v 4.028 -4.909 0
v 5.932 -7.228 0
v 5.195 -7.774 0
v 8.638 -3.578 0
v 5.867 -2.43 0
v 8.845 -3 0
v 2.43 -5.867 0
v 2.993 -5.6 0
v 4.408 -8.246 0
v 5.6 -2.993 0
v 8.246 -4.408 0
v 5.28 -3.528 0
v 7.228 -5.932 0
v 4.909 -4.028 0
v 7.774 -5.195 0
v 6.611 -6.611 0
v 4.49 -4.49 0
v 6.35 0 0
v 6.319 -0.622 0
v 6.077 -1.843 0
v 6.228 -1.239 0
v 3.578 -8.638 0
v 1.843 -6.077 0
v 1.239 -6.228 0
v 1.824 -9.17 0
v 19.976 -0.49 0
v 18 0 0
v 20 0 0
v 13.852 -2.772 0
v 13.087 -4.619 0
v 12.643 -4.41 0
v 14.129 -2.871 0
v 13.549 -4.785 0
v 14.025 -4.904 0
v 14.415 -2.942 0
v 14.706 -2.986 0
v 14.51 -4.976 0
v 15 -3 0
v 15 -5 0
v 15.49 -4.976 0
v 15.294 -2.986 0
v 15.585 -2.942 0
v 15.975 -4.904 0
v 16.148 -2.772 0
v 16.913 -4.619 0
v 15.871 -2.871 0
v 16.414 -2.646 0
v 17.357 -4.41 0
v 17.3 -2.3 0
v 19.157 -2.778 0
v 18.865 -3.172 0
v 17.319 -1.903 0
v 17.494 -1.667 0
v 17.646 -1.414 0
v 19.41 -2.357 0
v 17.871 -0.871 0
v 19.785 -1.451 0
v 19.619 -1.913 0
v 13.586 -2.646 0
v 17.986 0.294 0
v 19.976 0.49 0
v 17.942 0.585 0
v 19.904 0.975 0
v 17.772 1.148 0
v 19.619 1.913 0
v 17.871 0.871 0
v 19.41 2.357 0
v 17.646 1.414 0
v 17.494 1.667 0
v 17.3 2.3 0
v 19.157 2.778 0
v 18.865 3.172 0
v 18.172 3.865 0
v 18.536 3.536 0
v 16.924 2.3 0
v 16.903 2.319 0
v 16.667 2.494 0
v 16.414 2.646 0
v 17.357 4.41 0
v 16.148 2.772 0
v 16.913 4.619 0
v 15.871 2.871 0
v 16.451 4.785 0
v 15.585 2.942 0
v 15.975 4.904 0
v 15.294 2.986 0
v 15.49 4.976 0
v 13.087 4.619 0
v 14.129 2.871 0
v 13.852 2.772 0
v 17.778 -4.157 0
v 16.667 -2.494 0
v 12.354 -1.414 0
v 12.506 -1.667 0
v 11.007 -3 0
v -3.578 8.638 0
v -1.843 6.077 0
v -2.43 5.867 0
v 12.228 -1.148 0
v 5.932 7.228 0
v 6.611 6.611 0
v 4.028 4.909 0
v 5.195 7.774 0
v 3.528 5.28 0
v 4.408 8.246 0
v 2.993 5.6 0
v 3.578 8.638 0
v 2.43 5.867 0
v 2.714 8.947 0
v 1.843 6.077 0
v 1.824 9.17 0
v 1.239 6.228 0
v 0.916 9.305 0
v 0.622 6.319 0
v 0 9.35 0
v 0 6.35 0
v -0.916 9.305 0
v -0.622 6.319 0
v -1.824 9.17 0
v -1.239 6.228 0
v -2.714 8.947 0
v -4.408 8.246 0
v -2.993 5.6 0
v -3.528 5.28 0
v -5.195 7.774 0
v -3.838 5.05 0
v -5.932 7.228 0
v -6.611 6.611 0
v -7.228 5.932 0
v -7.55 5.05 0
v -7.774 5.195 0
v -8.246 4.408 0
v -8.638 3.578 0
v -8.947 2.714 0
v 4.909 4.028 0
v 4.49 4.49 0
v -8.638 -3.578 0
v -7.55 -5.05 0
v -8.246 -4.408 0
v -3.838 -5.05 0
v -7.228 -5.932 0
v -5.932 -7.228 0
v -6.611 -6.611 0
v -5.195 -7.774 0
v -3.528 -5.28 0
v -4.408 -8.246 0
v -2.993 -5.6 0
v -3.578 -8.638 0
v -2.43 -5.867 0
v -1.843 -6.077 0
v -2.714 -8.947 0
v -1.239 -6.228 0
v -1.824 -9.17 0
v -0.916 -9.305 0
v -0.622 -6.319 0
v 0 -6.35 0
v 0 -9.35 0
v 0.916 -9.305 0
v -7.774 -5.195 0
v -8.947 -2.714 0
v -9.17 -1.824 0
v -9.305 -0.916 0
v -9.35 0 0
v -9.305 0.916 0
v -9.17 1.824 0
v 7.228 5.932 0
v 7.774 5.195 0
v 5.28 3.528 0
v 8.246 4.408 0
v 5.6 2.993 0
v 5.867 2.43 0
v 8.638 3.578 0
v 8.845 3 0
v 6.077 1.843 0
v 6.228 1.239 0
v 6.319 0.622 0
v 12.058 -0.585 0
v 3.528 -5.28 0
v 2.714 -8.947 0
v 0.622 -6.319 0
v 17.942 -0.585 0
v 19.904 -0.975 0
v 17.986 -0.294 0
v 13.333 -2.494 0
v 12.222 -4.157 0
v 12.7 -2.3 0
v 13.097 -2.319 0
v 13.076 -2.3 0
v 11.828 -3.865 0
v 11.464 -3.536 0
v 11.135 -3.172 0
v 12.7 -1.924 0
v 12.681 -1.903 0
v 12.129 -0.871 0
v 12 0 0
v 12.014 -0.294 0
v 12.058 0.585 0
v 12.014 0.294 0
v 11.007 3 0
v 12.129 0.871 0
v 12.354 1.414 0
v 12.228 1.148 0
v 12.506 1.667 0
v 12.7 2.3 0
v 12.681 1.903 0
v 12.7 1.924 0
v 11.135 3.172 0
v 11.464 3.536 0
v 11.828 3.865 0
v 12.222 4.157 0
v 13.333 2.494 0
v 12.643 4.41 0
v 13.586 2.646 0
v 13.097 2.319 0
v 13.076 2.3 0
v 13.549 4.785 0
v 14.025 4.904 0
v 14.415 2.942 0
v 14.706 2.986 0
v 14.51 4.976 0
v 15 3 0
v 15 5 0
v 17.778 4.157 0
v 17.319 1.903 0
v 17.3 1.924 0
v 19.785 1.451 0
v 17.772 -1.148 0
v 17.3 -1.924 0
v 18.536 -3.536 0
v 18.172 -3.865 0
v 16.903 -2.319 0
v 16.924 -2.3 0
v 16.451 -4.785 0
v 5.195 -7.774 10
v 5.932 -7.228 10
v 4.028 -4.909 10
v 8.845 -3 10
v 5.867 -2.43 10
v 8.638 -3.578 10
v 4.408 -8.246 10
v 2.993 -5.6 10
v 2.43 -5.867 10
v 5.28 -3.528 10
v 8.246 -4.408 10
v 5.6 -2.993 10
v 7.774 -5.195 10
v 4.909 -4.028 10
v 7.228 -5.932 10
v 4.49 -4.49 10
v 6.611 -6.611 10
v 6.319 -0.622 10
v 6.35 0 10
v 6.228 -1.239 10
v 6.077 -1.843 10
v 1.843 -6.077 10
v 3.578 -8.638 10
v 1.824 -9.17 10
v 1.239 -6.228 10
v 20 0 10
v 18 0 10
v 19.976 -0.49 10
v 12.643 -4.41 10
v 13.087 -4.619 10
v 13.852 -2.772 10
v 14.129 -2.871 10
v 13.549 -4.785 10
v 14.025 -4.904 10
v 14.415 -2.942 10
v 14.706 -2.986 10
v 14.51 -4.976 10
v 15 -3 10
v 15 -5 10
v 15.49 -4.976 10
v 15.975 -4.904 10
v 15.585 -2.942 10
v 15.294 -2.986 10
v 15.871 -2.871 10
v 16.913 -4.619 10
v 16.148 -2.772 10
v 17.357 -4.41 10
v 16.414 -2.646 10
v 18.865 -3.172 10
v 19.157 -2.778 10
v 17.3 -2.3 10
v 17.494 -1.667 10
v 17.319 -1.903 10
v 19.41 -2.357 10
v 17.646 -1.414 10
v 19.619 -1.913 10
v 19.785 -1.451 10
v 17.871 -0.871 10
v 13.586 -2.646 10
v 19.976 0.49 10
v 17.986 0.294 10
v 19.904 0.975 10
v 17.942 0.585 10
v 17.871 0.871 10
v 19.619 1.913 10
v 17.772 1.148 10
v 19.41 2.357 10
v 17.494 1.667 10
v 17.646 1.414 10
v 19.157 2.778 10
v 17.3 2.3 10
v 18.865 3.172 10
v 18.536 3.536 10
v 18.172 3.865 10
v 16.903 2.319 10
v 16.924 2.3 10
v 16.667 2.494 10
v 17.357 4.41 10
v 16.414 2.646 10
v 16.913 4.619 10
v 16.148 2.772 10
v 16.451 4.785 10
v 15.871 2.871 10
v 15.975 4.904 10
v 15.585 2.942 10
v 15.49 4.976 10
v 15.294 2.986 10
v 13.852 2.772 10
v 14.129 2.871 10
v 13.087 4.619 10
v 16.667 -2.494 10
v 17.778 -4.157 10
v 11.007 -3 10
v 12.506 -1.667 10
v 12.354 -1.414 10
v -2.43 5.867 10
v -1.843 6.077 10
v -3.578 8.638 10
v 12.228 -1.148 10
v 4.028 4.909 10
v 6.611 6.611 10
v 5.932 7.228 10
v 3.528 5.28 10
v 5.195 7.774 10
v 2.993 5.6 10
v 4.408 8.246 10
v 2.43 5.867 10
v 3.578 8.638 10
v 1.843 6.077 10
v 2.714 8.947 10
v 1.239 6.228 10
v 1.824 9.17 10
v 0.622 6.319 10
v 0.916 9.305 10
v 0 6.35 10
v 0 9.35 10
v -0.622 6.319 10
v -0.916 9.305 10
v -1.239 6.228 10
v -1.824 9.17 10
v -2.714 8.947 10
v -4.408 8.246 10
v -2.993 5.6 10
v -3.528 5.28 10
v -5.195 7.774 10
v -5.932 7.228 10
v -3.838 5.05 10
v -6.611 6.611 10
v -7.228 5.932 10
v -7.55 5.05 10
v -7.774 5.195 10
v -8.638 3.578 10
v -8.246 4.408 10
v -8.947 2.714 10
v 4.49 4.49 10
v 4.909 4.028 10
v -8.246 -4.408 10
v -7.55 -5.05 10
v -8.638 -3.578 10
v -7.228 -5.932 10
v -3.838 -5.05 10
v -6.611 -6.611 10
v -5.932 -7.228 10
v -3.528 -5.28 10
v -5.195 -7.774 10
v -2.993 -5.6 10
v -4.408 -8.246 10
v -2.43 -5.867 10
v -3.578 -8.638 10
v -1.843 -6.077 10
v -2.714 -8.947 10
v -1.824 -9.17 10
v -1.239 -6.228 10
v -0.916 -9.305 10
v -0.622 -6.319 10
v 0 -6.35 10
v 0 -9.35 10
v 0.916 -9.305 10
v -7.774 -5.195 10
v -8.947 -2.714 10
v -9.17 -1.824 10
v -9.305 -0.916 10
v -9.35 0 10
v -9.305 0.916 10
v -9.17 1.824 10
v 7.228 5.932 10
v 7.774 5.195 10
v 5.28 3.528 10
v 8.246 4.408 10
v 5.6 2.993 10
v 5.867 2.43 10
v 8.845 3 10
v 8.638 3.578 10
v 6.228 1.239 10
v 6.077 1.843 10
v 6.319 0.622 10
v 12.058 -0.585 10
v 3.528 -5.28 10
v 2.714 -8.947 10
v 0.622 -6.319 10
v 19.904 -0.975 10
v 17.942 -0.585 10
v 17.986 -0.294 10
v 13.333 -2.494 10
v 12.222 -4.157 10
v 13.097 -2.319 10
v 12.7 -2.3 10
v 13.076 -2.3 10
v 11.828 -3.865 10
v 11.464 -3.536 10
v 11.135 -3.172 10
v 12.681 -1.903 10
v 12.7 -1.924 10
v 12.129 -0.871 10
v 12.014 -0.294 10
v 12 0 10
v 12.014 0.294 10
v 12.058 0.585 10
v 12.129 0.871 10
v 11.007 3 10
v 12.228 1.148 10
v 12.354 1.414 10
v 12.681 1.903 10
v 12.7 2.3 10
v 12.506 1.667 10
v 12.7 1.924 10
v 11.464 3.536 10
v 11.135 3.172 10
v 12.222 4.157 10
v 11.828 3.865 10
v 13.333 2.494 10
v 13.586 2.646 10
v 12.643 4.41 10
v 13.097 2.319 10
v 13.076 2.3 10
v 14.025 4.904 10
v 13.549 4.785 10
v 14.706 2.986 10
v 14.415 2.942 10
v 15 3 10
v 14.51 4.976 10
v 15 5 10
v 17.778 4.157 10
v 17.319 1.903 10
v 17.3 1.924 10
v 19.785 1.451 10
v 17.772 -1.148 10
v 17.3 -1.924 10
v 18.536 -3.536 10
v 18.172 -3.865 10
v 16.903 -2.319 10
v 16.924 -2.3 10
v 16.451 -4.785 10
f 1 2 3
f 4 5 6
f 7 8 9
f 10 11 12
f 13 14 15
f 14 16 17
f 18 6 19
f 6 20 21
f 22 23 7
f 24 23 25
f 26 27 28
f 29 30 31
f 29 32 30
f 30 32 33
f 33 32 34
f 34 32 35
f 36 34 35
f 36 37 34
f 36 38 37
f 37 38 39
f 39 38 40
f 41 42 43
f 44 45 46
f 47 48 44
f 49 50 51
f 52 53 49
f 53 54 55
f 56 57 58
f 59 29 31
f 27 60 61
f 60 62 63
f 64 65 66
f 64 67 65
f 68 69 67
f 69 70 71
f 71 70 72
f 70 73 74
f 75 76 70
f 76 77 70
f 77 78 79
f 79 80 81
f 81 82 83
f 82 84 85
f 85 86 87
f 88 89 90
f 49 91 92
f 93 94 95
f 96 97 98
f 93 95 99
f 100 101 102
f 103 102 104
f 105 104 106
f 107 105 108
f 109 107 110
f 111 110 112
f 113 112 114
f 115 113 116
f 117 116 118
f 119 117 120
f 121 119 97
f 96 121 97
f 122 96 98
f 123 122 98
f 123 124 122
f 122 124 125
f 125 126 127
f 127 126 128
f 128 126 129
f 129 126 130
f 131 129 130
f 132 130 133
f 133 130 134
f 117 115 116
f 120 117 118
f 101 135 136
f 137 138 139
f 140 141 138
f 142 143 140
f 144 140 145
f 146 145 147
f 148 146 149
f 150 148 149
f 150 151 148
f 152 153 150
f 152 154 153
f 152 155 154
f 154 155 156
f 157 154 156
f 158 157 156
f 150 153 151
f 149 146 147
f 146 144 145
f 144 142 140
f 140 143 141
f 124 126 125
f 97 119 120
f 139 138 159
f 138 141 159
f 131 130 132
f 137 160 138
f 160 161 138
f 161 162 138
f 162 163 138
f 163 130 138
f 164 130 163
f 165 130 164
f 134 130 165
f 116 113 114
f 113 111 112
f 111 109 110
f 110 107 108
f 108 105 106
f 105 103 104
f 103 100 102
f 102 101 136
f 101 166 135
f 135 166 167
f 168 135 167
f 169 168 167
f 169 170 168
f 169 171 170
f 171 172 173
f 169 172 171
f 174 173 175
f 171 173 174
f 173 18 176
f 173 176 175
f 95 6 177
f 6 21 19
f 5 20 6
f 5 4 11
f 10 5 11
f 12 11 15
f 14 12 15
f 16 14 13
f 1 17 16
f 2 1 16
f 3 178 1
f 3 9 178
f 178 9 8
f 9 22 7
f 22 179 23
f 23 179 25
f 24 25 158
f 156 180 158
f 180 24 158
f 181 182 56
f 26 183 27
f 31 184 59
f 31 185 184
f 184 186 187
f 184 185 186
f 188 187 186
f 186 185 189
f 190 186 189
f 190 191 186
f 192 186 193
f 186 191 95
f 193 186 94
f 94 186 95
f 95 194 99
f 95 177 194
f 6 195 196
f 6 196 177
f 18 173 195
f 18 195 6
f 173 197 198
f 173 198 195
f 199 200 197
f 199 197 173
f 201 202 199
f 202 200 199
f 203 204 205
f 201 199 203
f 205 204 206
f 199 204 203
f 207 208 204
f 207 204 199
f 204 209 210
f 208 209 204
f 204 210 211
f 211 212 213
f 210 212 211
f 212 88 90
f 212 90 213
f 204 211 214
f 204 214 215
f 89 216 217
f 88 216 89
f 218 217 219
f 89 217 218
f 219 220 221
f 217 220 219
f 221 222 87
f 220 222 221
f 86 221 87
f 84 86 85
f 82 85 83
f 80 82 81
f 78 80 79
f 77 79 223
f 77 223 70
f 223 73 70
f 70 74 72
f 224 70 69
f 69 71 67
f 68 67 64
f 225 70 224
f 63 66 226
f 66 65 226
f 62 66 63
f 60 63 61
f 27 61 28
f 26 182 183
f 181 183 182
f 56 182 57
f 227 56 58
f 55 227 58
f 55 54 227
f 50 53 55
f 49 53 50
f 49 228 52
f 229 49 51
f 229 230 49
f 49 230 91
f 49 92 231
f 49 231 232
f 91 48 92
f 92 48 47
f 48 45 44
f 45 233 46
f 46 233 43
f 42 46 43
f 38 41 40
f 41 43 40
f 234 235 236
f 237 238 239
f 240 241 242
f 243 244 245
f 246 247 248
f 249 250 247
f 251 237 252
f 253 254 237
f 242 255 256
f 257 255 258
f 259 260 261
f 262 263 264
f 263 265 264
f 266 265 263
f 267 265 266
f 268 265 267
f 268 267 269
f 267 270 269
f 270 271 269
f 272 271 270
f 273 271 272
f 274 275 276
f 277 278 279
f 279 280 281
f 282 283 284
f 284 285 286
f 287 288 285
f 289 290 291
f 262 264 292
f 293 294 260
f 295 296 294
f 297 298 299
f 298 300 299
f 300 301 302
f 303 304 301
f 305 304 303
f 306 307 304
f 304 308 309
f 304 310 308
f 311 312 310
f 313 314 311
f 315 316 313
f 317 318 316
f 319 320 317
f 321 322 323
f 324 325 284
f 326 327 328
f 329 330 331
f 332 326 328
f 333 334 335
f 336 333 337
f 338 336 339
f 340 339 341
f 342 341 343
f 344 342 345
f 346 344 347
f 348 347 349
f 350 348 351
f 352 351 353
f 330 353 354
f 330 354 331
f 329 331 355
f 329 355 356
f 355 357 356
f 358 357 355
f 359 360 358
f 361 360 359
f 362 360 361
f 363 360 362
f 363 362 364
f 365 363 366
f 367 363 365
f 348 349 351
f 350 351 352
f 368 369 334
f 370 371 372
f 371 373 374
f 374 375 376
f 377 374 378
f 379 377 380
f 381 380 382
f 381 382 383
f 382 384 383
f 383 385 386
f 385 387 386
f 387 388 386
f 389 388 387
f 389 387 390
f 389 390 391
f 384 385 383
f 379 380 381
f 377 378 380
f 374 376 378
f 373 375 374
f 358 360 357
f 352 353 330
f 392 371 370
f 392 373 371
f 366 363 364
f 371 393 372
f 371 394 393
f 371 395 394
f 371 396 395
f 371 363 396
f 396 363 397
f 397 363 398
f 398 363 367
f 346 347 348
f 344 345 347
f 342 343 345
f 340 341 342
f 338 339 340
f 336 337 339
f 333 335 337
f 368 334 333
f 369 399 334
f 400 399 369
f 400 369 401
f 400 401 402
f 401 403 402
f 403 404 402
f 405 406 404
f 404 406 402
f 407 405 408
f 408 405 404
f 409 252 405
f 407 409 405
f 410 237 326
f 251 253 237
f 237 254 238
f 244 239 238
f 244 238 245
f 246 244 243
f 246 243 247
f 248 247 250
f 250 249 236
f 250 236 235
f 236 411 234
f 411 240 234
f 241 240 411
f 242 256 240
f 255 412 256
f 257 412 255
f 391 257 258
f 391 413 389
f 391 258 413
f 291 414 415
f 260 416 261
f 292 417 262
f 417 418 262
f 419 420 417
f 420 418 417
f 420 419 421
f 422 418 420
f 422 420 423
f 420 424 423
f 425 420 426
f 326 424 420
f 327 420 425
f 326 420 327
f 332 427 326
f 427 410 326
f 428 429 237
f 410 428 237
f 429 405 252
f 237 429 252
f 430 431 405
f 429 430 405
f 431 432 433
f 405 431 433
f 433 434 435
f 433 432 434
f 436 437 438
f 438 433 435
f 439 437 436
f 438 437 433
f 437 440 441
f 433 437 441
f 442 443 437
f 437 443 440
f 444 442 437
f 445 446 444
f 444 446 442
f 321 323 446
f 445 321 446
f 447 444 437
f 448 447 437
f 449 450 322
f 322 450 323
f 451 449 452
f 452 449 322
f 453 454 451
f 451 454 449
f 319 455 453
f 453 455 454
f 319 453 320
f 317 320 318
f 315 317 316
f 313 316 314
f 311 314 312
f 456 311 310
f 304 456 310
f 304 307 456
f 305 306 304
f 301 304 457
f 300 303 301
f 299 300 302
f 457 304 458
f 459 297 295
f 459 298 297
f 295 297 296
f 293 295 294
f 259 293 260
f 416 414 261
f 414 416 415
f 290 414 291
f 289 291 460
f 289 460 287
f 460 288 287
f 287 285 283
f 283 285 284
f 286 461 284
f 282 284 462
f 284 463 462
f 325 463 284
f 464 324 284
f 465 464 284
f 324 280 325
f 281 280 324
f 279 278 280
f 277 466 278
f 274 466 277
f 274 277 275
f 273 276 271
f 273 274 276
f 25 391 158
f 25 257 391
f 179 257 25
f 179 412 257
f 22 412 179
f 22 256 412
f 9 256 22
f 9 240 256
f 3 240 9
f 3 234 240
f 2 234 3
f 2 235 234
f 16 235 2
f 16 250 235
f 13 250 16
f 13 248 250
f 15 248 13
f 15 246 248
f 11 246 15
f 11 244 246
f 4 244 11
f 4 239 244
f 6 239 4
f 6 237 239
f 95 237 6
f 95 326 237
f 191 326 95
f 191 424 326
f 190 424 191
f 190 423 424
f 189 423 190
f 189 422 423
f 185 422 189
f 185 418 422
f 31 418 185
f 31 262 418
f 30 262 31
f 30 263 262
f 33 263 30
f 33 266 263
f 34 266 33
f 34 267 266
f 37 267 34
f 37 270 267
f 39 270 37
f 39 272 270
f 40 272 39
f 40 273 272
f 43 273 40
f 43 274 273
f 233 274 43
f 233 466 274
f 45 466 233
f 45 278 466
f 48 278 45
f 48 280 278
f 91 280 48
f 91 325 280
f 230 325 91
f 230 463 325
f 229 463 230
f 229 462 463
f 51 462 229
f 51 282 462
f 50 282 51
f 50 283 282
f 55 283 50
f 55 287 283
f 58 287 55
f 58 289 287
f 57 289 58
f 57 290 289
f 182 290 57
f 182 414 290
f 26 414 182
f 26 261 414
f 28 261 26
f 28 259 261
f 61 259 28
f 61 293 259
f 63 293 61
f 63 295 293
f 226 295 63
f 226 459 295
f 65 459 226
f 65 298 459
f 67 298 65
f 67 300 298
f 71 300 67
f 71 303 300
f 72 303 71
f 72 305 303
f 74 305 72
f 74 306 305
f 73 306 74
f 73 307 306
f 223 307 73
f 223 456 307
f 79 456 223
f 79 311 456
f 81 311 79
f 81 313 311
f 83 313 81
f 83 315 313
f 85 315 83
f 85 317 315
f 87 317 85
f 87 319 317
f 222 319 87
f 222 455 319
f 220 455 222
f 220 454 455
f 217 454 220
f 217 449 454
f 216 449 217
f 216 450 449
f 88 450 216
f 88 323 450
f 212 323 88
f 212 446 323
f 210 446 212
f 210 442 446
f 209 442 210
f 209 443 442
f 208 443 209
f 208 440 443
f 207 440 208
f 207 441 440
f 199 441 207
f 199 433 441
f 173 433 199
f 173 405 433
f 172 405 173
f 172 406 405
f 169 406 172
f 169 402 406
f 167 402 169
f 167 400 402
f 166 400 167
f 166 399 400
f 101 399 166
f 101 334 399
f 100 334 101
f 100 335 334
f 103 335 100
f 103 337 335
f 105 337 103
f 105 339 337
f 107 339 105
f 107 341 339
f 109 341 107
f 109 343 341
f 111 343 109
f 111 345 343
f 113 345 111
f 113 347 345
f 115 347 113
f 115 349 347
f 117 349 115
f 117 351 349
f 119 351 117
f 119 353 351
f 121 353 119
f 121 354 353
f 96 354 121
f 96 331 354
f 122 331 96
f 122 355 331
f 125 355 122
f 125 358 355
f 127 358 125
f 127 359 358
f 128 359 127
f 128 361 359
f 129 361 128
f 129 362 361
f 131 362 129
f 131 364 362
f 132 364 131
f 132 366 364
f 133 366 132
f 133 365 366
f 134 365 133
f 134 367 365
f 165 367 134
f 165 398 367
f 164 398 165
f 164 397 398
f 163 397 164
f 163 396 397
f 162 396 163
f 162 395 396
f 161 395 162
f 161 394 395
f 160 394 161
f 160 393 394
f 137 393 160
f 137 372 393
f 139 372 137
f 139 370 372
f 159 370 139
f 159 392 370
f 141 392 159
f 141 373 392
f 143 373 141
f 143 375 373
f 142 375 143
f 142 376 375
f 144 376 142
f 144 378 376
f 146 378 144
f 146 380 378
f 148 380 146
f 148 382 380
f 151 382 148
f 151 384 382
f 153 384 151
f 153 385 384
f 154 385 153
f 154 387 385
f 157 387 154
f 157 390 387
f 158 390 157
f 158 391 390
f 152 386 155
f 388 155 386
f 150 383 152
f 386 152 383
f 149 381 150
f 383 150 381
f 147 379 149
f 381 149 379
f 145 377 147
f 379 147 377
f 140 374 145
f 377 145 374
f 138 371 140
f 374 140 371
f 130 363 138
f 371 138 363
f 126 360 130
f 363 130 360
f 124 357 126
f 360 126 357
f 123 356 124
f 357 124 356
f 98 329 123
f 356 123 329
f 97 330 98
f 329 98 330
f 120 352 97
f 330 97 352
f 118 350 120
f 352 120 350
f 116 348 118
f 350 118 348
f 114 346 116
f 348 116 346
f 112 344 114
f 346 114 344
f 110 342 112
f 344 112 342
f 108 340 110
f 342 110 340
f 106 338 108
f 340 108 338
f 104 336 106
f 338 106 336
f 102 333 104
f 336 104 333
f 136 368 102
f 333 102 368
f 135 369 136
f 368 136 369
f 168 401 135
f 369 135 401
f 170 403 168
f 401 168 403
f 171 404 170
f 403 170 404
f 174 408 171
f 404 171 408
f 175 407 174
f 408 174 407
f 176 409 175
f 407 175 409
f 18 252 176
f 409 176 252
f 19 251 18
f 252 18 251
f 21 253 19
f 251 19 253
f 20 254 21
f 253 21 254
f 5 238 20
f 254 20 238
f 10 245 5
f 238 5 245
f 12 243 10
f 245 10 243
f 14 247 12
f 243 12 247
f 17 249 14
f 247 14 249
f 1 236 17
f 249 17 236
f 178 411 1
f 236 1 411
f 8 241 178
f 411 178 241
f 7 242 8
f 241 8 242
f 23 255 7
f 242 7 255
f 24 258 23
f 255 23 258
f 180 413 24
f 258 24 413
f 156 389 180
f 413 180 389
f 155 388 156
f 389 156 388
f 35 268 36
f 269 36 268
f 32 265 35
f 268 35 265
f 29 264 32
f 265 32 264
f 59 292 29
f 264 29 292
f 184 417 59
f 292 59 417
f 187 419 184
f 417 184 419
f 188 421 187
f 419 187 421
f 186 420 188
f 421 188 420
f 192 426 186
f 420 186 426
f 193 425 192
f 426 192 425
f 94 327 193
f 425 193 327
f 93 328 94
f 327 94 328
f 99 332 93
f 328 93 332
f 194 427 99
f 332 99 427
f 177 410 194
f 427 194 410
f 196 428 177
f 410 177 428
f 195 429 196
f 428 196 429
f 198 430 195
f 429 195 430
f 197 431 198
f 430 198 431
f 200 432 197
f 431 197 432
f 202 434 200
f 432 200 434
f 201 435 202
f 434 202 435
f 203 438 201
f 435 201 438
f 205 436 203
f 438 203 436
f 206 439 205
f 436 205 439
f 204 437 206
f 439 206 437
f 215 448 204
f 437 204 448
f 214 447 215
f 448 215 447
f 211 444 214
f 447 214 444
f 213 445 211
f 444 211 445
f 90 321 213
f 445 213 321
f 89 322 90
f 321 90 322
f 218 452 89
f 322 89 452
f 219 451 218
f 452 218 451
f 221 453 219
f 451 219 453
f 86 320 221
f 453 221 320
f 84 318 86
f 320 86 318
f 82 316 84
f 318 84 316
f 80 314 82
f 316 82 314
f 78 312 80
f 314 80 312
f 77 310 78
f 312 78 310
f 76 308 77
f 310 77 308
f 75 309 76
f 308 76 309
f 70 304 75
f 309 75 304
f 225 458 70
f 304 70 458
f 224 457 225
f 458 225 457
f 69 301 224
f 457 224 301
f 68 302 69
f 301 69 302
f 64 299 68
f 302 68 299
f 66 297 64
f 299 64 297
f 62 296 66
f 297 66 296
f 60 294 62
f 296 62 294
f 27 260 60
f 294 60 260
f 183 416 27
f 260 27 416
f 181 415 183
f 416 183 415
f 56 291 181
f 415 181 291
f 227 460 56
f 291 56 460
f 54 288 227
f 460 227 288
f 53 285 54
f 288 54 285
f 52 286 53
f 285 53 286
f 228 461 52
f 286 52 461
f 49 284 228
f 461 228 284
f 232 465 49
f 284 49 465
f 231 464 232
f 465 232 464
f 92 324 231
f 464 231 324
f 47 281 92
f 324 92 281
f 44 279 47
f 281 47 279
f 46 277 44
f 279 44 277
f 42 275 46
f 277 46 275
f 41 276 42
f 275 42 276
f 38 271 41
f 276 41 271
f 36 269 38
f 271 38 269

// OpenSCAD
// --- Parameters (Dimensions in mm) ---

// Rod Ring (Inner diameter 12.7mm, Wall 3mm)
rod_inner_dia = 12.7;
rod_wall = 3.0;
rod_outer_dia = rod_inner_dia + (2 * rod_wall); // 18.7mm

// Rod Ring Cutout (10mm wide, 10mm tall, centered on -X side)
// Specification: "10 mm wide opening cut out of its -X side (everything with x < 0 and -5 < y < 5 is removed)"
// This means the cutout is a rectangle from x = -5 to x = 0 and y = -5 to y = 5.
rod_cutout_x_start = -5.0;
rod_cutout_x_end = 0.0;
rod_cutout_y_start = -5.0;
rod_cutout_y_end = 5.0;

// Tubing Ring (Inner diameter 6mm, Wall 2mm)
tube_inner_dia = 6.0;
tube_wall = 2.0;
tube_outer_dia = tube_inner_dia + (2 * tube_wall); // 10.0mm
tube_offset_x = 15.0;

// Tubing Ring Cutout (4.5mm wide, centered on +X side)
// Specification: "4.5 mm wide opening cut out of its +X side (x > 15 and -2.25 < y < 2.25)"
// This means the cutout is a rectangle from x = 15 to x = 19.5 and y = -2.25 to y = 2.25.
tube_cutout_x_start = 15.0;
tube_cutout_x_end = 19.5;
tube_cutout_y_start = -2.25;
tube_cutout_y_end = 2.25;

// Bridge (6mm wide in Y, between x=8 and x=12)
bridge_x_start = 8.0;
bridge_x_end = 12.0;
bridge_y_width = 6.0;

// Extrusion Height
extrusion_z = 10.0;

// Resolution
$fn = 64;

// --- Modeling ---

module profile_2d() {
    difference() {
        union() {
            // 1. Rod Ring Profile
            difference() {
                circle(d = rod_outer_dia);
                circle(d = rod_inner_dia);
            }
            
            // 2. Tubing Ring Profile
            translate([tube_offset_x, 0])
            difference() {
                circle(d = tube_outer_dia);
                circle(d = tube_inner_dia);
            }
            
            // 3. Solid Bridge Profile
            // Spans from x=8 to x=12, centered on Y
            translate([(bridge_x_start + bridge_x_end)/2, 0])
                square([bridge_x_end - bridge_x_start, bridge_y_width], center = true);
        }

        // Subtract Rod Cutout: x < 0 and -5 < y < 5
        // We extend the subtraction slightly to ensure it cuts through the ring wall.
        // The ring's outer edge is at x = -9.35. We cut from -10 to 0.
        translate([rod_cutout_x_start, 0])
            square([rod_cutout_x_end - rod_cutout_x_start + 0.1, rod_cutout_y_end - rod_cutout_y_start + 0.1], center = true);

        // Subtract Tubing Cutout: x > 15 and -2.25 < y < 2.25
        // The tube's outer edge is at x = 20. We cut from 15 to 21.
        translate([tube_cutout_x_start, 0])
            square([tube_cutout_x_end - tube_cutout_x_start + 0.1, tube_cutout_y_end - tube_cutout_y_start + 0.1], center = true);
    }
}

// Final 3D Object: Extrude the 2D profile
linear_extrude(height = extrusion_z) {
    profile_2d();
}
